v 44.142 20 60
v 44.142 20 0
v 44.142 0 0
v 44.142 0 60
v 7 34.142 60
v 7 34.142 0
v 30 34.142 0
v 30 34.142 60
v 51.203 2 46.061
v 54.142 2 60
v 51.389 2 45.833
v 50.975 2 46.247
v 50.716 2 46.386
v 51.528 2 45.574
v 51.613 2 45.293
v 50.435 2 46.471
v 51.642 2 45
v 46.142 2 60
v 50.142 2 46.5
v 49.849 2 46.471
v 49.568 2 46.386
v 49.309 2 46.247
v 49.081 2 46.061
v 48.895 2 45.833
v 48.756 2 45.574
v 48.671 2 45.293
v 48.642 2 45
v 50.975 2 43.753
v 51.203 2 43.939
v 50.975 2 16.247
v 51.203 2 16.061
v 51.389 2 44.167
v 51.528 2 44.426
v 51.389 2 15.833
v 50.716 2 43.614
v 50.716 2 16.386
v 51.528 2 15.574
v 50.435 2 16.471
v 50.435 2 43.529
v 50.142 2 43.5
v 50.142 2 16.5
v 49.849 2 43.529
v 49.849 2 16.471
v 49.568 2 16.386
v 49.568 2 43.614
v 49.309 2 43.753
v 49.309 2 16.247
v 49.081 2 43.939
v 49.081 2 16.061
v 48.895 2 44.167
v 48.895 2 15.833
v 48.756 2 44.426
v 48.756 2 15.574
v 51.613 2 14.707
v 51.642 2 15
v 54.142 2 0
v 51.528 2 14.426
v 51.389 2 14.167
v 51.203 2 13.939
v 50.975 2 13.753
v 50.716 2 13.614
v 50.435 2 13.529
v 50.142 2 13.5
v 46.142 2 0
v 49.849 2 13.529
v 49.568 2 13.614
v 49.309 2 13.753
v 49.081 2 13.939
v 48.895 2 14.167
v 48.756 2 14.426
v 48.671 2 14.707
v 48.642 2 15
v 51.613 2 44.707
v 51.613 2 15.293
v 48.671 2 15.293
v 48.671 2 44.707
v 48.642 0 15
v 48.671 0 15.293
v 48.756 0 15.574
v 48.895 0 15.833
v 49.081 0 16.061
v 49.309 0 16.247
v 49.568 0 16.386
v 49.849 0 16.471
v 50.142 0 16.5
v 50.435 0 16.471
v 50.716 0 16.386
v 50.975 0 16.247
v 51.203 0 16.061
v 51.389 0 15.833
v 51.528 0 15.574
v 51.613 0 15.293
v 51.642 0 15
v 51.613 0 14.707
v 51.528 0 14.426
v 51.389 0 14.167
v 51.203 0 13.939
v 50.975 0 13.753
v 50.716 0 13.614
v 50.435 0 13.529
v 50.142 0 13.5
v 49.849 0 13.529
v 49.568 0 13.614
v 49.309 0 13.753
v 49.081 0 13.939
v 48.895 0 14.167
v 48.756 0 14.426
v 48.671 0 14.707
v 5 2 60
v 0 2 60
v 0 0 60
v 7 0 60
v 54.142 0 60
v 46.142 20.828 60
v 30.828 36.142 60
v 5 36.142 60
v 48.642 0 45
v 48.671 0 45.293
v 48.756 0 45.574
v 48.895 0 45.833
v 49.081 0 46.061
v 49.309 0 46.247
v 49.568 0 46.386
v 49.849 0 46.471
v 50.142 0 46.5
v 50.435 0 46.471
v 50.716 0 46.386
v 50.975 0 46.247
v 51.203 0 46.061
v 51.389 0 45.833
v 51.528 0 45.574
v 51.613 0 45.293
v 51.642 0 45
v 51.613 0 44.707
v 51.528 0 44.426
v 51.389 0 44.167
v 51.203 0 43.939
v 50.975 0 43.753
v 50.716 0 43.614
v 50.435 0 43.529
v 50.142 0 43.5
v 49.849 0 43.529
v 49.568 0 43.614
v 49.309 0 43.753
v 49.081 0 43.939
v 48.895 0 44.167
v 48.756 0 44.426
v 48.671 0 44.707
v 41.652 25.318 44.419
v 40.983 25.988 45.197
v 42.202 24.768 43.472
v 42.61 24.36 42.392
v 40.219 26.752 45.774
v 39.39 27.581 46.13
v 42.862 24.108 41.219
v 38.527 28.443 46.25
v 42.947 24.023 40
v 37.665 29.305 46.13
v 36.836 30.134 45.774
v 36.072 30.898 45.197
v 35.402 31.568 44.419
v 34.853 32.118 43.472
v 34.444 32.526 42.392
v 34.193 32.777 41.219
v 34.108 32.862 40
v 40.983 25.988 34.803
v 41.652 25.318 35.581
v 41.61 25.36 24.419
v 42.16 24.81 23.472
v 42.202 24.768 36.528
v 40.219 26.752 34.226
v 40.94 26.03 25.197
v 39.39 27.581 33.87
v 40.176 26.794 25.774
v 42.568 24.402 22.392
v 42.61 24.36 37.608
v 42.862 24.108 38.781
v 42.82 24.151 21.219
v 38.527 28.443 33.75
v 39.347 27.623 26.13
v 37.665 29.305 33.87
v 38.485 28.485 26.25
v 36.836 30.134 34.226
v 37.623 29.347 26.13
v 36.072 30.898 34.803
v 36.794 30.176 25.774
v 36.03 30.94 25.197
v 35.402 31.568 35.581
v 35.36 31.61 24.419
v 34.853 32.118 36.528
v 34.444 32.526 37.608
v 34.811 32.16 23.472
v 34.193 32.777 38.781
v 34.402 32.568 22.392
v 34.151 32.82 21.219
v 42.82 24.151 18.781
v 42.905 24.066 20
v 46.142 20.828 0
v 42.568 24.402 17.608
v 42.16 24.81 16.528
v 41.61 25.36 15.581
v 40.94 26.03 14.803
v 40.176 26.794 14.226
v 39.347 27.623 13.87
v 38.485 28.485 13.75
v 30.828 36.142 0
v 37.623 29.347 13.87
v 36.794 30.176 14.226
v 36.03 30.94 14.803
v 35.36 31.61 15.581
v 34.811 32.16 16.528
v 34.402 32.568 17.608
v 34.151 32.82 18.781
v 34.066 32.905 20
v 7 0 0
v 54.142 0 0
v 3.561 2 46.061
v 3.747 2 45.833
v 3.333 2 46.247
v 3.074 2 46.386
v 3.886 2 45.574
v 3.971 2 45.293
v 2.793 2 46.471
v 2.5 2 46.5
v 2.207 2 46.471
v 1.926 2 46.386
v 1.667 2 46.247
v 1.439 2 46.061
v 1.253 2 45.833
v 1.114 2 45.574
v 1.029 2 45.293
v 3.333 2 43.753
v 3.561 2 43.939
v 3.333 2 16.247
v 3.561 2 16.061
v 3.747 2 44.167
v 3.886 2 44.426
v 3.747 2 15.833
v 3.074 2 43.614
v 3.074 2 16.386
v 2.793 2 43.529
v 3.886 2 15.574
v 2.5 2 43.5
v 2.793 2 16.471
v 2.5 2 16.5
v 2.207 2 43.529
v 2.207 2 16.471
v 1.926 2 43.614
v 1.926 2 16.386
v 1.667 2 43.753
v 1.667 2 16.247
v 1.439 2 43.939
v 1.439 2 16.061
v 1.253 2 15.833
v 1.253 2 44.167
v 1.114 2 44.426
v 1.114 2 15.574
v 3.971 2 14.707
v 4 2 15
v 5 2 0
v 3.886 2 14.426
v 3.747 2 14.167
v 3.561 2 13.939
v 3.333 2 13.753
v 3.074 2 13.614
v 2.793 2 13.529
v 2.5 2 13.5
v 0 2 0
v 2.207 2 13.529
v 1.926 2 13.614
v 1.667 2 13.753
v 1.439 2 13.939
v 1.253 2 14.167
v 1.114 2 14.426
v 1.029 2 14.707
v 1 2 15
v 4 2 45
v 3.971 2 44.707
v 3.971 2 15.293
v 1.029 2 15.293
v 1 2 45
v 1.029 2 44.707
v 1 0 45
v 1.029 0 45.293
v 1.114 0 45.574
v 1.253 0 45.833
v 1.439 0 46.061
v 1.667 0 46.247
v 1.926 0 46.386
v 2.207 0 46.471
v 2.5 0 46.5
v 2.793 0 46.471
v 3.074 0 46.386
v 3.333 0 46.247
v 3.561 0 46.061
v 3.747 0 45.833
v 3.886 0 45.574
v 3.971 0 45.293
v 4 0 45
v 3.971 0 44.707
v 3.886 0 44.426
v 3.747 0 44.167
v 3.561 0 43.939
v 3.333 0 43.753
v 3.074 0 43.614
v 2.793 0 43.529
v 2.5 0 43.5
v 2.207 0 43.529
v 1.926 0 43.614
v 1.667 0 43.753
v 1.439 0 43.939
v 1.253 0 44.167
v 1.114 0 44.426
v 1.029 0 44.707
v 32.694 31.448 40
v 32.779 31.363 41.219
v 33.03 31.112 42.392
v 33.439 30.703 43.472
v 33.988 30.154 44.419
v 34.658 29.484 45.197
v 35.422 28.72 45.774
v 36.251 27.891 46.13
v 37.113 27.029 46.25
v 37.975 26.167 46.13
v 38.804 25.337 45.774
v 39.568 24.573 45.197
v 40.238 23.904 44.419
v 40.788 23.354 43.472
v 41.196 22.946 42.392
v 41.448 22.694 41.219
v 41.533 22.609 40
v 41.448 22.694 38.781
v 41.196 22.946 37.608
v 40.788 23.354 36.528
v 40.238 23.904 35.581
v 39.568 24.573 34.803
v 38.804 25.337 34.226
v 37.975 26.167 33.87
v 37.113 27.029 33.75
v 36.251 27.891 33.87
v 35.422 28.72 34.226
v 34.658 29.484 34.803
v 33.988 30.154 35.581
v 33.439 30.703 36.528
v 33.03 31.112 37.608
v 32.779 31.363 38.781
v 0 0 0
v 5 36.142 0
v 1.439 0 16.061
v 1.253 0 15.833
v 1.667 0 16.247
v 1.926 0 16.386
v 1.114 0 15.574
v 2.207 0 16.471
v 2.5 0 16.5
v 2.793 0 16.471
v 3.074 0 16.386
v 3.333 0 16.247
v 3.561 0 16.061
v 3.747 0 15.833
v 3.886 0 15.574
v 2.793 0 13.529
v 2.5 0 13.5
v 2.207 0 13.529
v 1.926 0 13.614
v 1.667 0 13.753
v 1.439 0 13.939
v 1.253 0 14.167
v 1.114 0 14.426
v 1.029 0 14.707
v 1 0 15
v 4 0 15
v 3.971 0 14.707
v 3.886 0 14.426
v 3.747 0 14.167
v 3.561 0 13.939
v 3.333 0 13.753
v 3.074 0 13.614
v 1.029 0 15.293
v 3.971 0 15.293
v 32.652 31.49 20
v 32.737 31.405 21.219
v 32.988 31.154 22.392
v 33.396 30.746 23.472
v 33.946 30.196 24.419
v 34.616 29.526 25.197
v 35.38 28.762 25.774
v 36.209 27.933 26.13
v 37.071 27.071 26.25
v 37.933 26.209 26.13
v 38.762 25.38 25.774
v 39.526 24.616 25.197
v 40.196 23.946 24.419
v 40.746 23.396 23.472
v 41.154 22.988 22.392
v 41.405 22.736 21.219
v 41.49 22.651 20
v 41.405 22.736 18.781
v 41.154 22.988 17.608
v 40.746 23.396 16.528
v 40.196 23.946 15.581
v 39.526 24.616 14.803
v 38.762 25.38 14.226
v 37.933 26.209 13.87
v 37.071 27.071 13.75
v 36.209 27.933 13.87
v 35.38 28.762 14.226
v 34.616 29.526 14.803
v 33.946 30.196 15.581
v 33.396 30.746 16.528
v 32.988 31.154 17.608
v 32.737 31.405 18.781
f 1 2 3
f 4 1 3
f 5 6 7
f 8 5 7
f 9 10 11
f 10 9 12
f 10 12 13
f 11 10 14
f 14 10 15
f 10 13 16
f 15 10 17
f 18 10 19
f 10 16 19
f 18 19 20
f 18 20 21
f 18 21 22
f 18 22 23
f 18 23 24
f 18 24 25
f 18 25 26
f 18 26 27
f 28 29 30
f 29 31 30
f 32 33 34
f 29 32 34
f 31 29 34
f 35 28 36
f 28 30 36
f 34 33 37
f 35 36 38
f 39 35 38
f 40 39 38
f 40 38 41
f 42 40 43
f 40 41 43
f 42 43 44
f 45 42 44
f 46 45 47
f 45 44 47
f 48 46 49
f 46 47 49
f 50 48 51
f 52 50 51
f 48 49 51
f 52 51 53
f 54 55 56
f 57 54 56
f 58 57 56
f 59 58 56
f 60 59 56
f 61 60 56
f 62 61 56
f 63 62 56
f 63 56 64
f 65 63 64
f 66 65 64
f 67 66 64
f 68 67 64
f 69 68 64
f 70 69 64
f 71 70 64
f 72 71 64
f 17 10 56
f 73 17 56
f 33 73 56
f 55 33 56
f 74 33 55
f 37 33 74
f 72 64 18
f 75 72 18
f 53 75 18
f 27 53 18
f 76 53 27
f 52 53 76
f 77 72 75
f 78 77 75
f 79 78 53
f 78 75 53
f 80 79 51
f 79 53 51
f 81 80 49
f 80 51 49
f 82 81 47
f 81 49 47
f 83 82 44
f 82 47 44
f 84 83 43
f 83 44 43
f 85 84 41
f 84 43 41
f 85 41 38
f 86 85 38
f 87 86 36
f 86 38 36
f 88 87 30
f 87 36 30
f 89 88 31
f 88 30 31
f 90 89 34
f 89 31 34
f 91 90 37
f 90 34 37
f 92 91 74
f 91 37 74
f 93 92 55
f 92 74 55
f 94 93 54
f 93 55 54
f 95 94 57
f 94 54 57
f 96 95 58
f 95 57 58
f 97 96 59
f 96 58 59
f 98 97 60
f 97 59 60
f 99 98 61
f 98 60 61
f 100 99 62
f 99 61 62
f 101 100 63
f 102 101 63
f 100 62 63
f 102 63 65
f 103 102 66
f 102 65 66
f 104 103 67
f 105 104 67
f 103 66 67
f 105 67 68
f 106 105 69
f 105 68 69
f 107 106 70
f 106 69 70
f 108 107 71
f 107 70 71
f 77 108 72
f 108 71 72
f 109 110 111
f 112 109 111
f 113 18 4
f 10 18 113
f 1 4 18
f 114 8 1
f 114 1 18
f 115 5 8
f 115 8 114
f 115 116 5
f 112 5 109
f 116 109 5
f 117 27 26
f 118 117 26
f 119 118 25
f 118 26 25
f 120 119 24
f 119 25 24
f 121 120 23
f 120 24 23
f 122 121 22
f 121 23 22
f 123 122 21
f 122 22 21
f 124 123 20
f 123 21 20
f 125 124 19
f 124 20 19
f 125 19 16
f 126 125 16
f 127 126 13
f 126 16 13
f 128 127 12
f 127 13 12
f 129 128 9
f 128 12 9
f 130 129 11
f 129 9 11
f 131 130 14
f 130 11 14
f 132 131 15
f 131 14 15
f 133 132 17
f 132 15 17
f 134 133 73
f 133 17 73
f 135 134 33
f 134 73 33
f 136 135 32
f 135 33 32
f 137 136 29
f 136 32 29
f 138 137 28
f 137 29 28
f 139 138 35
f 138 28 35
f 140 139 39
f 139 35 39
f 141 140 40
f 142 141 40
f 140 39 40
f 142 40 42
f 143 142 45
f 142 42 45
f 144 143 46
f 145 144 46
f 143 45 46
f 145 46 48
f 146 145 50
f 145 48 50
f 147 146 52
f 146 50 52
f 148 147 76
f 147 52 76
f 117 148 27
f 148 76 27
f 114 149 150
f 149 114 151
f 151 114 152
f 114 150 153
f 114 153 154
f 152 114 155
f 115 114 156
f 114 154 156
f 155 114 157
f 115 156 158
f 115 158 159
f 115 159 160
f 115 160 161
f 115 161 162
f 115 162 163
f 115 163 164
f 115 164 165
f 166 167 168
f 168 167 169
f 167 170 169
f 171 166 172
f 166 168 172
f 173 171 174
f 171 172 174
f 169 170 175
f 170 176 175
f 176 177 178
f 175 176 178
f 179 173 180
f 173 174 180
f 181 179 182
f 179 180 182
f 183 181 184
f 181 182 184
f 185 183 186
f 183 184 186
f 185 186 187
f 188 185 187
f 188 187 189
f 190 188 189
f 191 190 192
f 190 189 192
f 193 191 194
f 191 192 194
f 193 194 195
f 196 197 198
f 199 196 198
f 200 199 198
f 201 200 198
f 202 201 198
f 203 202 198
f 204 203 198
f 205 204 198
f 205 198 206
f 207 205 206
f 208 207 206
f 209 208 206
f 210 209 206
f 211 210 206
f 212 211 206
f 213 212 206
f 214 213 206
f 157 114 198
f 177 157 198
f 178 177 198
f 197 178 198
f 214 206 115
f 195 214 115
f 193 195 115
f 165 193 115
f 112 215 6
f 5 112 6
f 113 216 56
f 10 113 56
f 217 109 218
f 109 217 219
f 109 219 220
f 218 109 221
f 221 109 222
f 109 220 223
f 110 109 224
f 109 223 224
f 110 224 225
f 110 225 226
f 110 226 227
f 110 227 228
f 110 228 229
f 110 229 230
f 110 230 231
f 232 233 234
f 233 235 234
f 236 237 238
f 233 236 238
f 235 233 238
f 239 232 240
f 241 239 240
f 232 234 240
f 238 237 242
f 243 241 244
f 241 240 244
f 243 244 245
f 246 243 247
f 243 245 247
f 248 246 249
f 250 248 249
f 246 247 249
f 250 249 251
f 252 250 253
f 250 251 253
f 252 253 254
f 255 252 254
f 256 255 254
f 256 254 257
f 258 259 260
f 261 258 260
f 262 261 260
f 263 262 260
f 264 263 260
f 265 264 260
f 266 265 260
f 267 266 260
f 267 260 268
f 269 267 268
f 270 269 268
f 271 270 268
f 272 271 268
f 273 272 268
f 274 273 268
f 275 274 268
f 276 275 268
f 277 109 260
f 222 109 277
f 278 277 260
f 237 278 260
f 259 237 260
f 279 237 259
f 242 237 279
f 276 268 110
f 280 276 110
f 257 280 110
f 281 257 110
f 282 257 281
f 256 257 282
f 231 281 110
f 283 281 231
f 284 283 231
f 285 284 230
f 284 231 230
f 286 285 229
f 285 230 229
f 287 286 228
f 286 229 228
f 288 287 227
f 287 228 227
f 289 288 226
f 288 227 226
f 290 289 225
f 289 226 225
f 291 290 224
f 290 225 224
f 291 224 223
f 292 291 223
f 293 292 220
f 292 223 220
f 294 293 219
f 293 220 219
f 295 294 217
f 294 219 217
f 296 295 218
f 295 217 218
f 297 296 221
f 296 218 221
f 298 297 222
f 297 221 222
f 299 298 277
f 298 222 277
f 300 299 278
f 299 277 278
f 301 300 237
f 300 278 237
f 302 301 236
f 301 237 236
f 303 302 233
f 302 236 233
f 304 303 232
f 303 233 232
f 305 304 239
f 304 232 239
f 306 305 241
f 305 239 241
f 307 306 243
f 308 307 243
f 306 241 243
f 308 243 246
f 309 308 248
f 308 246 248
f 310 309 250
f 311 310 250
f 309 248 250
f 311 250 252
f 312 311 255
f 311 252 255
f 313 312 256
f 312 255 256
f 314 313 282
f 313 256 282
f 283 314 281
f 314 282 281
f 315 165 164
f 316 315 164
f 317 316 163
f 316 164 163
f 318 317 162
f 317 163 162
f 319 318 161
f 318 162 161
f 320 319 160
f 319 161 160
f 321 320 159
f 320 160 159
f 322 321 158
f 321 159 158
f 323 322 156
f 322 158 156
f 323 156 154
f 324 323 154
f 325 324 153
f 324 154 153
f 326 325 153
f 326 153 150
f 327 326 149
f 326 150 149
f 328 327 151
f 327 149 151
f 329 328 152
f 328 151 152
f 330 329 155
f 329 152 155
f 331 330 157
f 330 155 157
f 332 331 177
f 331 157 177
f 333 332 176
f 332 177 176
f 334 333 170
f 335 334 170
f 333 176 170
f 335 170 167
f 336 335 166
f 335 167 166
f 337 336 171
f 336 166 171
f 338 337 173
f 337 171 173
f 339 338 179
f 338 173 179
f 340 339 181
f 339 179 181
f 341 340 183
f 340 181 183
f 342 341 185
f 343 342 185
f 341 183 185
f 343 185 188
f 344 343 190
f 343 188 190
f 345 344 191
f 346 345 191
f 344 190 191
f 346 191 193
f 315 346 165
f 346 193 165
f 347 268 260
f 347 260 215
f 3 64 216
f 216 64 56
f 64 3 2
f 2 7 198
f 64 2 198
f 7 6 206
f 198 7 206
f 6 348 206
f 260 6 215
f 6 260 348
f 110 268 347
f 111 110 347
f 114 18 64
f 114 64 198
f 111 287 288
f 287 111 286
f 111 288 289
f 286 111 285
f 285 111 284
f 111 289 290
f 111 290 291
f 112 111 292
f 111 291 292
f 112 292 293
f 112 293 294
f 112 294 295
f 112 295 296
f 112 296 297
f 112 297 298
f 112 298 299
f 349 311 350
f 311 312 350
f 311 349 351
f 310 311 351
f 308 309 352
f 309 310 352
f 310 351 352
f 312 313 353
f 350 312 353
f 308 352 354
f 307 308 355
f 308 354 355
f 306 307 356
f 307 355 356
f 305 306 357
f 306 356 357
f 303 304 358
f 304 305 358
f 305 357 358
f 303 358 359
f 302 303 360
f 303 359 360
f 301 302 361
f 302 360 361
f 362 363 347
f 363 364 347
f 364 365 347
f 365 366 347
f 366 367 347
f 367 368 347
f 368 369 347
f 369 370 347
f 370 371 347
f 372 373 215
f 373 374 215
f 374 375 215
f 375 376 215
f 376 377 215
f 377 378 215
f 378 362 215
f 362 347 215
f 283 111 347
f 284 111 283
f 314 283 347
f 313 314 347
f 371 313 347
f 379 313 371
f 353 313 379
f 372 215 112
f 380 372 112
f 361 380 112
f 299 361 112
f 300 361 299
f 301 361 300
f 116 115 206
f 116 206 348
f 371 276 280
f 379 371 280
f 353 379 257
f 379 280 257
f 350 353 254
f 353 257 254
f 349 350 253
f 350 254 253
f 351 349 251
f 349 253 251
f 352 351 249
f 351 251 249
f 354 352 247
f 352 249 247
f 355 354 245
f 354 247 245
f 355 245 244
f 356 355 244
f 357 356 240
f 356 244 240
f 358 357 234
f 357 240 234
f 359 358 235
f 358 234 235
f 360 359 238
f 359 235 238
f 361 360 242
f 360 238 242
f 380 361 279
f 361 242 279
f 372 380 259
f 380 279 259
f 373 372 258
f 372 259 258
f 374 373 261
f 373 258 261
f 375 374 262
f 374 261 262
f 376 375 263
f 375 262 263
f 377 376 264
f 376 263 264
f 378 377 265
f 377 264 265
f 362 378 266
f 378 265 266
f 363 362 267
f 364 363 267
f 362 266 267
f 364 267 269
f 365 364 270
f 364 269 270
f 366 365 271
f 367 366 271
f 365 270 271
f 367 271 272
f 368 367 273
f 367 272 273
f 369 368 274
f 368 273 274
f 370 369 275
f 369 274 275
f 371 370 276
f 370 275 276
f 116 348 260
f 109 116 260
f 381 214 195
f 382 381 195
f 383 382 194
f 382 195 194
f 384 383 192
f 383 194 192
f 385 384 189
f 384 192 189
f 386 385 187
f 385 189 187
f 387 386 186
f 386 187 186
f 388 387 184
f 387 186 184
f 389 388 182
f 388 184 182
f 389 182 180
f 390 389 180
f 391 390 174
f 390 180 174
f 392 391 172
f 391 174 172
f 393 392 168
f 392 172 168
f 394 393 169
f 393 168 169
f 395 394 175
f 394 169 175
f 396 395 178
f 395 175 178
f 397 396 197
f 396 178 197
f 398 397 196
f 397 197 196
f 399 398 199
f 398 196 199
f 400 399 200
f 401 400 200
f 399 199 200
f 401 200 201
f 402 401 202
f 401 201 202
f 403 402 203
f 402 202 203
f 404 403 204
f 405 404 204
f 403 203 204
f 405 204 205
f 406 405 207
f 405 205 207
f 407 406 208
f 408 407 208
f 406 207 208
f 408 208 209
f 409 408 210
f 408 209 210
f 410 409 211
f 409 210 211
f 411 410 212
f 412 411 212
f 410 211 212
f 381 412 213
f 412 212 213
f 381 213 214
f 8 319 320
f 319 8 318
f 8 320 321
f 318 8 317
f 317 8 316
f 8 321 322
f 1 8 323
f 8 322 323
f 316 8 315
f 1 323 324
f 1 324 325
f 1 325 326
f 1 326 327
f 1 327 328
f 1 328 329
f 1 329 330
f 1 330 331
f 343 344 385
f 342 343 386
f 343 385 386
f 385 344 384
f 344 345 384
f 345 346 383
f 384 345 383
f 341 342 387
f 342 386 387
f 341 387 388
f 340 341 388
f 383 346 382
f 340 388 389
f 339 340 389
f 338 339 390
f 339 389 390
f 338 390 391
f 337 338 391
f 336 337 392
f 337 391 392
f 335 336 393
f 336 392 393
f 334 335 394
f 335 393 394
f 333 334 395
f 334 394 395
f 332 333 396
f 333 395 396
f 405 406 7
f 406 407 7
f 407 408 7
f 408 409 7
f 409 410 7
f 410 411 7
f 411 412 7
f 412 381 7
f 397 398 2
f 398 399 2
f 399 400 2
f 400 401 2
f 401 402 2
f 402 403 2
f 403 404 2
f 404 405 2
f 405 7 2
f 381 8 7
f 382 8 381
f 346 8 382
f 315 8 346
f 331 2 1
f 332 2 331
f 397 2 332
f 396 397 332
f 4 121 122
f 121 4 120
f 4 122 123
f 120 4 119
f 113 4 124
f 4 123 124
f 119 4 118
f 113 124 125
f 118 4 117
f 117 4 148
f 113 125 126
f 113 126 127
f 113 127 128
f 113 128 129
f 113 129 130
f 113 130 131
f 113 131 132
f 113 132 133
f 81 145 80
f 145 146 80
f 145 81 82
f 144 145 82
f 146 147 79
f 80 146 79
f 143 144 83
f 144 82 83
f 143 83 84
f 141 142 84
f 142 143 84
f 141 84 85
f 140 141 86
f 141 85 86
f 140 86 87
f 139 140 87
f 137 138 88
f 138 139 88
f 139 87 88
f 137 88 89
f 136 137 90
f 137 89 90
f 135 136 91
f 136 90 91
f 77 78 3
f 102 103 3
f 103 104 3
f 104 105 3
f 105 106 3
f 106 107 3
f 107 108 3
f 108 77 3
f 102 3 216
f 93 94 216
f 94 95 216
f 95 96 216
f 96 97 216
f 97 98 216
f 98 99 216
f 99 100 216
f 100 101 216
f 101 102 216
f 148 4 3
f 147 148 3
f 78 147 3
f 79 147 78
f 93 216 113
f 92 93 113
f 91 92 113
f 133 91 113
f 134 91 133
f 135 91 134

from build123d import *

# Parameters (mm, degrees)
F1_DEPTH = 60
F2_R     = 6.25
F3_DEPTH = 2
F4_DEPTH = 2
F5_R     = 1.5
F6_DEPTH = 2
F7_R     = 1.5
F8_DEPTH = 2


with BuildPart() as f1:
    # F0 (on Top) → F1 (new body)
    with BuildSketch(Plane.XY):
        Polygon((0, 2), (0, 0), (7.0000001118, 0), (7.0000001118, 34.142), (30, 34.142), (44.142, 19.9997287538), (44.142, 0), (54.142, 0), (54.142, 2), (46.142, 2), (46.142, 20.8281446432), (30.8284383602, 36.142), (5.0000001118, 36.142), (5.0000001118, 2), align=None)
    extrude(amount=F1_DEPTH)

    # F2 (on face) → F3 (cut)
    with BuildSketch(Plane(origin=(33.4855148215, 33.4848725755, 0), x_dir=(-0.7071, 0.7071135623, 0), z_dir=(0.7071135623, 0.7071, 0))):
        with Locations((-7.1303164004, 40)):
            Circle(F2_R)
    extrude(amount=-F3_DEPTH, mode=Mode.SUBTRACT)

    # F2 (on face) → F4 (cut)
    with BuildSketch(Plane(origin=(33.4855148215, 33.4848725755, 0), x_dir=(-0.7071, 0.7071135623, 0), z_dir=(0.7071135623, 0.7071, 0))):
        with Locations((-7.0707175203, 20)):
            Circle(F2_R)
    extrude(amount=-F4_DEPTH, mode=Mode.SUBTRACT)

    # F5 (on face) → F6 (cut)
    with BuildSketch(Plane(origin=(0, 2, 0), x_dir=(-1, 0, 0), z_dir=(0, 1, 0))):
        with Locations((-50.142, 45)):
            Circle(F5_R)
        with Locations((-50.142, 15)):
            Circle(F5_R)
    extrude(amount=-F6_DEPTH, mode=Mode.SUBTRACT)

    # F7 (on face) → F8 (cut)
    with BuildSketch(Plane(origin=(0, 2, 0), x_dir=(-1, 0, 0), z_dir=(0, 1, 0))):
        with Locations((-2.5000000559, 15)):
            Circle(F7_R)
        with Locations((-2.5000000559, 45)):
            Circle(F7_R)
    extrude(amount=-F8_DEPTH, mode=Mode.SUBTRACT)


solid = f1.part
